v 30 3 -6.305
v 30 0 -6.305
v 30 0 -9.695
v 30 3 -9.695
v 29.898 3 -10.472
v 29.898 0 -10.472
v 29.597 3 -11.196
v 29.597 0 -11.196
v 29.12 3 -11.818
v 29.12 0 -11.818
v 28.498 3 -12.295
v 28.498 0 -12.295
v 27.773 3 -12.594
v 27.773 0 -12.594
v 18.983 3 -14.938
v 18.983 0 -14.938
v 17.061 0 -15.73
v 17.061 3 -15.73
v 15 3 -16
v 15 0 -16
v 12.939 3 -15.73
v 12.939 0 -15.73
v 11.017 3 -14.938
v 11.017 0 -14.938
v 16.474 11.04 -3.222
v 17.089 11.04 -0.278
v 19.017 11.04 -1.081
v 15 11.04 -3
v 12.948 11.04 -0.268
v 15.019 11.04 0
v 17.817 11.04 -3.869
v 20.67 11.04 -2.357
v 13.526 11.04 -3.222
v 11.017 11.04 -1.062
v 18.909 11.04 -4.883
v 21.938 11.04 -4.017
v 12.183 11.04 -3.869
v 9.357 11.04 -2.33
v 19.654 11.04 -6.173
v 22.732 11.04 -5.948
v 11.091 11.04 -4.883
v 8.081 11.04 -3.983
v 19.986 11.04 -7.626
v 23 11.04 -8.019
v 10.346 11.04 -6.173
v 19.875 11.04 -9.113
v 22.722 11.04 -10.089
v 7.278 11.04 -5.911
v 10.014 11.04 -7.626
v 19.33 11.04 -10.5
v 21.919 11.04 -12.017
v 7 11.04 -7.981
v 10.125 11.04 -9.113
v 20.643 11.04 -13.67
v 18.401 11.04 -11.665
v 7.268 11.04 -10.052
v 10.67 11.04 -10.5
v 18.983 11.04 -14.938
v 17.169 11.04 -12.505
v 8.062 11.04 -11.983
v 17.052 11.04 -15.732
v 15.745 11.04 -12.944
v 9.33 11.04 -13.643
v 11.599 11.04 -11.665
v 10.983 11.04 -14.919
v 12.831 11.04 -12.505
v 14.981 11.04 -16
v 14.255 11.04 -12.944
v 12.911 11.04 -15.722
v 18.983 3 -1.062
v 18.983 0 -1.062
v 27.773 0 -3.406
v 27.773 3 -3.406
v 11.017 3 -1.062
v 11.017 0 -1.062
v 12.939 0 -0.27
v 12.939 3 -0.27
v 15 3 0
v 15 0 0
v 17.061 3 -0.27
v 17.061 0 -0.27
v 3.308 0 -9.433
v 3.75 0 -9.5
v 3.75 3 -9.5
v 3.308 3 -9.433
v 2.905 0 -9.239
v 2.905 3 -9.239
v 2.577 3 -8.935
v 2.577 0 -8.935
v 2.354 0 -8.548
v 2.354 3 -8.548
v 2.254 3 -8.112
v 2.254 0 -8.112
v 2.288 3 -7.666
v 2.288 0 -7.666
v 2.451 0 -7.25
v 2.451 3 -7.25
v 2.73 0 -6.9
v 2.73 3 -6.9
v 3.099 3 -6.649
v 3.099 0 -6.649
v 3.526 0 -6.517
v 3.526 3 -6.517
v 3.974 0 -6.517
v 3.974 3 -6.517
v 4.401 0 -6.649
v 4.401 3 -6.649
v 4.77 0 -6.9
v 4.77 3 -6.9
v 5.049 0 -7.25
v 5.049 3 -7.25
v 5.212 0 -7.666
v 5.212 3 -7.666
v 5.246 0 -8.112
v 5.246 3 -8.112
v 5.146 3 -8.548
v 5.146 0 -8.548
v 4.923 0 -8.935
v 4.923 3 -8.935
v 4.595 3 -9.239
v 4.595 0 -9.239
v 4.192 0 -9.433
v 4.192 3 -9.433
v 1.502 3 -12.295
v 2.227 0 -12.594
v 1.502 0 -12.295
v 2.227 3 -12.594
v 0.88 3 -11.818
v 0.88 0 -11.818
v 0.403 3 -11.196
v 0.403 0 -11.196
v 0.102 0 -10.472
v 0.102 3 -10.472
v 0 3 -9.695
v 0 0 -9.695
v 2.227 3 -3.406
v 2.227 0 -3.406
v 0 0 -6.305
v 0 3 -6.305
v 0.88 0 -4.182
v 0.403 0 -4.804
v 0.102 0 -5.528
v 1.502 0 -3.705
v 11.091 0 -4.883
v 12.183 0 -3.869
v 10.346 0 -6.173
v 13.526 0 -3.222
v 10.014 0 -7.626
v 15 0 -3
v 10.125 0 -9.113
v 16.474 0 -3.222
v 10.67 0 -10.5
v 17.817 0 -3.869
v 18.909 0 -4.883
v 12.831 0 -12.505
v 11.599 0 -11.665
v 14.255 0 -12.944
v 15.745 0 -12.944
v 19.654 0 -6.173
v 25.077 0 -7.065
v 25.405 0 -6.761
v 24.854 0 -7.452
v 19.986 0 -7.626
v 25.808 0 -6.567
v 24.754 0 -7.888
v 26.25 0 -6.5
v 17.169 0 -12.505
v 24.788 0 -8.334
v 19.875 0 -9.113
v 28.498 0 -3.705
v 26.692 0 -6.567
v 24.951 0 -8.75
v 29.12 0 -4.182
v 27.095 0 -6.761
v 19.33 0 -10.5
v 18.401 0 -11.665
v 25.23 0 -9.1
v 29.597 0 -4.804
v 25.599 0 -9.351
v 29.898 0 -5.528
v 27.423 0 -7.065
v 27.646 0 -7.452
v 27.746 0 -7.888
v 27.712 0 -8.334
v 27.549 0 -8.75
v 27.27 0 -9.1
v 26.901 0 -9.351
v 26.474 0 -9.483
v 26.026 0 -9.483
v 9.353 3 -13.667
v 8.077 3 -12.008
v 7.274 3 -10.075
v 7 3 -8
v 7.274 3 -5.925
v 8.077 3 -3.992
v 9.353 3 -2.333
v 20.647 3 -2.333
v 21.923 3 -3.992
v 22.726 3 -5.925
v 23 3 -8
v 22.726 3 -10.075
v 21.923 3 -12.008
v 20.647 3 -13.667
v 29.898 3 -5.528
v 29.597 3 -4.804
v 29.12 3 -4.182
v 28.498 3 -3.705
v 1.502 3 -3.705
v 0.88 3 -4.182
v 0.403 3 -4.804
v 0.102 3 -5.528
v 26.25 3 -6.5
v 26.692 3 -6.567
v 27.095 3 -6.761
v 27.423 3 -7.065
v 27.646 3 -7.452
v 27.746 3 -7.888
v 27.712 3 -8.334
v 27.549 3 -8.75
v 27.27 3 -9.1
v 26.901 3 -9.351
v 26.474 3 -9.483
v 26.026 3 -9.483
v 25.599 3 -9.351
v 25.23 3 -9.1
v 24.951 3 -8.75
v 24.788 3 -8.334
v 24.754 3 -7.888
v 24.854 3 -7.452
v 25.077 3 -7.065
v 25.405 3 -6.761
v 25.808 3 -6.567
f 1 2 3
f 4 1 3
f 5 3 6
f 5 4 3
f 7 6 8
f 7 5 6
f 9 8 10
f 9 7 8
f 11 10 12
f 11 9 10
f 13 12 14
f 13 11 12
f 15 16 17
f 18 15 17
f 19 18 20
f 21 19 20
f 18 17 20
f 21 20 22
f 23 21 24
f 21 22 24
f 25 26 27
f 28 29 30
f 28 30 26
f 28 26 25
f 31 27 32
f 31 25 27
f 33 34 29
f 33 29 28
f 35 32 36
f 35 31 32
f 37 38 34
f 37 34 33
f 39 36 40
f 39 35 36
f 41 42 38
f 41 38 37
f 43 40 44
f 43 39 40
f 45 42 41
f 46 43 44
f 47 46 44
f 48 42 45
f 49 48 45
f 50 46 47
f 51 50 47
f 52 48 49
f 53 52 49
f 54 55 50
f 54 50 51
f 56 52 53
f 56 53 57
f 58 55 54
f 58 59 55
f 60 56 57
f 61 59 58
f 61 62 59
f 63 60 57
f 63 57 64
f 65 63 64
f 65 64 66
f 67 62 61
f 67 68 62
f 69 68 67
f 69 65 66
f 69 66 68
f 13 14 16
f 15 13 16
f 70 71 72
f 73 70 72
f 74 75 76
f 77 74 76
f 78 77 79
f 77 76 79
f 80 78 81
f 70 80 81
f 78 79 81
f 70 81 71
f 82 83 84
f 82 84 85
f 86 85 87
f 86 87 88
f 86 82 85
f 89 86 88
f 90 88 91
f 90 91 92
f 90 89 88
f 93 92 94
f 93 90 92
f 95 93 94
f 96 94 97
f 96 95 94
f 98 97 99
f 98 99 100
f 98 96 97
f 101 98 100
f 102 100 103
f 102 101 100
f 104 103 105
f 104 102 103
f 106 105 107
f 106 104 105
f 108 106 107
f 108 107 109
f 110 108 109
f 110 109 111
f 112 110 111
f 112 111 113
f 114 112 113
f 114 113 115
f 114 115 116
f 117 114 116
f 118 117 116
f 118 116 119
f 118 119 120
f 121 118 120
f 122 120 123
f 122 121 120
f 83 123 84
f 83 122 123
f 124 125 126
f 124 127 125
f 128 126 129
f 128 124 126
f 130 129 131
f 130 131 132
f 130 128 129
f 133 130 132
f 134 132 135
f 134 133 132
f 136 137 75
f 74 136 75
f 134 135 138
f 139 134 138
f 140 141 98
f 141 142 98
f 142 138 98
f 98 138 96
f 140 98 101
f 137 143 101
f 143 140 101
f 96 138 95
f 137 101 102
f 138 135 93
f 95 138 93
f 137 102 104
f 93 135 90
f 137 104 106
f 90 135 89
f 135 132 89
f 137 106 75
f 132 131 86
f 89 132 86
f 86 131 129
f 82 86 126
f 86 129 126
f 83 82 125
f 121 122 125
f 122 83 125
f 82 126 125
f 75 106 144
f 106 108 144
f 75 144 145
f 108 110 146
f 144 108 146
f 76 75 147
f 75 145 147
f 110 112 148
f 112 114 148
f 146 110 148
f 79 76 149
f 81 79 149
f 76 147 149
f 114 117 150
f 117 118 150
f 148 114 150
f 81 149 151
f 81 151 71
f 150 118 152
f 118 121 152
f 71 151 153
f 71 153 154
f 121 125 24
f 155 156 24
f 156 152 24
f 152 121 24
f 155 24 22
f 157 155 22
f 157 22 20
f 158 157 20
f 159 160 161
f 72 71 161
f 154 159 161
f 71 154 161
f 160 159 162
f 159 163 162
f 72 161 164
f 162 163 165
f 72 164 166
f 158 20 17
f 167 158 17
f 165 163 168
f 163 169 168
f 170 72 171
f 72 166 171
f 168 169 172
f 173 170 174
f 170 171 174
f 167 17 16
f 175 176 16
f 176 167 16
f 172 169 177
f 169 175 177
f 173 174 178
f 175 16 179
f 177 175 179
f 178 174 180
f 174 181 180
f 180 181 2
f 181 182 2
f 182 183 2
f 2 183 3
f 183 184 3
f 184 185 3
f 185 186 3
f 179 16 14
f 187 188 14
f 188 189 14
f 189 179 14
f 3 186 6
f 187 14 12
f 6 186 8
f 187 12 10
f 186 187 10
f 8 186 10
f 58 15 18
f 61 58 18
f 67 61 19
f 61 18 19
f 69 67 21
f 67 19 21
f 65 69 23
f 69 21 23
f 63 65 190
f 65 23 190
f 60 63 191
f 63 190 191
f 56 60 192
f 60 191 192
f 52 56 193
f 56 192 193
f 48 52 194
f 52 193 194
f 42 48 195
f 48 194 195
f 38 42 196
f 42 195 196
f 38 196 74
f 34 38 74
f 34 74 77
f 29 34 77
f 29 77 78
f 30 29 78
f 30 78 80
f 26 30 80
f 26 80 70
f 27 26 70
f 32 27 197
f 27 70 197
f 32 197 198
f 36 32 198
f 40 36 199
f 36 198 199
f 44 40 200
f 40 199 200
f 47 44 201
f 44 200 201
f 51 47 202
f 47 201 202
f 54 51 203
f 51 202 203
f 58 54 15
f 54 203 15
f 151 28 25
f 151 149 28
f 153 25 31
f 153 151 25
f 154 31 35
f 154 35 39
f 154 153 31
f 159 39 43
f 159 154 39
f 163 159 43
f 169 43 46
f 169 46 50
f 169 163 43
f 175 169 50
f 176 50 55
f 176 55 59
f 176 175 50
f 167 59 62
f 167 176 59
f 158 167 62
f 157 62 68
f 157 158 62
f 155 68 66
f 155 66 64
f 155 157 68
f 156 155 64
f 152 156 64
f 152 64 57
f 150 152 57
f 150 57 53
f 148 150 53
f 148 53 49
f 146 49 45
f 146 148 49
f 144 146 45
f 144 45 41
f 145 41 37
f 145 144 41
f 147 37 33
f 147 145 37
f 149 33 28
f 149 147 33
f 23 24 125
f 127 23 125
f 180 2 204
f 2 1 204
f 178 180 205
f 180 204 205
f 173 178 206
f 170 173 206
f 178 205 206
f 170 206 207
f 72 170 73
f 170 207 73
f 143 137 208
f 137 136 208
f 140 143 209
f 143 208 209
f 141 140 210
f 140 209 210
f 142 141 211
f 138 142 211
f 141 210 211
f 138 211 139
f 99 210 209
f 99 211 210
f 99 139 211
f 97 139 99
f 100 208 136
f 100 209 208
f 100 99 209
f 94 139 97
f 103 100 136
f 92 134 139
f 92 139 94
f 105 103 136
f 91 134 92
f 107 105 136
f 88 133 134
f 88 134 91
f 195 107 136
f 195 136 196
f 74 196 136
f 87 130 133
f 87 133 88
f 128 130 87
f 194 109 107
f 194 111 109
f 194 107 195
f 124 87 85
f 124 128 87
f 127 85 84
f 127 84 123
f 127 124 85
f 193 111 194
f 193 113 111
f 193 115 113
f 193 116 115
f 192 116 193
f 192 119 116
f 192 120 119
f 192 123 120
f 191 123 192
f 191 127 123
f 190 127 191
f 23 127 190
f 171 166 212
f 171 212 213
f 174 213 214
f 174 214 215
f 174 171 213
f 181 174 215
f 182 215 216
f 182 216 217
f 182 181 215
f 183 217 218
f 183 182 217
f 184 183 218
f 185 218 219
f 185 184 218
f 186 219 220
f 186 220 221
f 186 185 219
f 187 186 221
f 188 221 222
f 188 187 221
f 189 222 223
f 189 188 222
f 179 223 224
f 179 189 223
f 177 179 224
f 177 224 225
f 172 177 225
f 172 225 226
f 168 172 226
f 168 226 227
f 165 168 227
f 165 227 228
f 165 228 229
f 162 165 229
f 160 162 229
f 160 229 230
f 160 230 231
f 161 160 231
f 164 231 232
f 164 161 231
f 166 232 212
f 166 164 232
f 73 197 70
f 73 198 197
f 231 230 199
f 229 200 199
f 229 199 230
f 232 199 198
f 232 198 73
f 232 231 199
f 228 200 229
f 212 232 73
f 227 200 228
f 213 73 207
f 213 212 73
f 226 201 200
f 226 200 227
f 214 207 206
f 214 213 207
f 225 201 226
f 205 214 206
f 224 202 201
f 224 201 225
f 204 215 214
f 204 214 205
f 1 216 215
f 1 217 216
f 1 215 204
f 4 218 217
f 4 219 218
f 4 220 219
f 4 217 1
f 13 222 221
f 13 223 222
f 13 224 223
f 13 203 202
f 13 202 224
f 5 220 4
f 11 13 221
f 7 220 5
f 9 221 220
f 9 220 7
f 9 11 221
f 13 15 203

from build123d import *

# Parameters (mm, degrees)
SKETCH2_R           = 5
SKETCH2_R_2         = 1.5
BOSS_EXTRUDE1_DEPTH = 3
FILLET1_R           = 3
SKETCH3_R           = 8
SKETCH3_R_2         = 5
BOSS_EXTRUDE2_DEPTH = 8.04


with BuildPart() as part:
    # Sketch2 → Boss-Extrude1 (new body)
    with BuildSketch(Plane(origin=(0, 0, 0), x_dir=(1, 0, 0), z_dir=(0, 1, 0))):
        with BuildLine():
            Line((30, 4), (30, 12))
            Line((30, 12), (18.98340249, 14.937759336))
            ThreePointArc((18.98340249, 14.937759336), (15, 16), (11.01659751, 14.937759336))
            Line((11.01659751, 14.937759336), (0, 12))
            Line((0, 12), (0, 4))
            Line((0, 4), (11.01659751, 1.062240664))
            ThreePointArc((11.01659751, 1.062240664), (15, 0), (18.98340249, 1.062240664))
            Line((18.98340249, 1.062240664), (30, 4))
        make_face()
        with Locations(Location((15, 8, 0), (0, 0, 270))):
            Circle(SKETCH2_R, mode=Mode.SUBTRACT)
        with Locations(Location((26.25, 8, 0), (0, 0, 270))):
            Circle(SKETCH2_R_2, mode=Mode.SUBTRACT)
        with Locations(Location((3.75, 8, 0), (0, 0, 90))):
            Circle(SKETCH2_R_2, mode=Mode.SUBTRACT)
    extrude(amount=BOSS_EXTRUDE1_DEPTH)

    # Fillet1
    fillet1_edges = [part.edges().sort_by_distance(p)[0] for p in [
        (0, 1.5, -4),
        (0, 1.5, -12),
        (30, 1.5, -12),
        (30, 1.5, -4),
    ]]
    fillet(fillet1_edges, radius=FILLET1_R)

    # Sketch3 → Boss-Extrude2 (add)
    with BuildSketch(Plane(origin=(0, 3, 0), x_dir=(1, 0, 0), z_dir=(0, 1, 0))):
        with Locations(Location((15, 8, 0), (0, 0, 60.137165644))):
            Circle(SKETCH3_R)
        with Locations(Location((15, 8, 0), (0, 0, 270))):
            Circle(SKETCH3_R_2, mode=Mode.SUBTRACT)
    extrude(amount=BOSS_EXTRUDE2_DEPTH)


solid = part.part
